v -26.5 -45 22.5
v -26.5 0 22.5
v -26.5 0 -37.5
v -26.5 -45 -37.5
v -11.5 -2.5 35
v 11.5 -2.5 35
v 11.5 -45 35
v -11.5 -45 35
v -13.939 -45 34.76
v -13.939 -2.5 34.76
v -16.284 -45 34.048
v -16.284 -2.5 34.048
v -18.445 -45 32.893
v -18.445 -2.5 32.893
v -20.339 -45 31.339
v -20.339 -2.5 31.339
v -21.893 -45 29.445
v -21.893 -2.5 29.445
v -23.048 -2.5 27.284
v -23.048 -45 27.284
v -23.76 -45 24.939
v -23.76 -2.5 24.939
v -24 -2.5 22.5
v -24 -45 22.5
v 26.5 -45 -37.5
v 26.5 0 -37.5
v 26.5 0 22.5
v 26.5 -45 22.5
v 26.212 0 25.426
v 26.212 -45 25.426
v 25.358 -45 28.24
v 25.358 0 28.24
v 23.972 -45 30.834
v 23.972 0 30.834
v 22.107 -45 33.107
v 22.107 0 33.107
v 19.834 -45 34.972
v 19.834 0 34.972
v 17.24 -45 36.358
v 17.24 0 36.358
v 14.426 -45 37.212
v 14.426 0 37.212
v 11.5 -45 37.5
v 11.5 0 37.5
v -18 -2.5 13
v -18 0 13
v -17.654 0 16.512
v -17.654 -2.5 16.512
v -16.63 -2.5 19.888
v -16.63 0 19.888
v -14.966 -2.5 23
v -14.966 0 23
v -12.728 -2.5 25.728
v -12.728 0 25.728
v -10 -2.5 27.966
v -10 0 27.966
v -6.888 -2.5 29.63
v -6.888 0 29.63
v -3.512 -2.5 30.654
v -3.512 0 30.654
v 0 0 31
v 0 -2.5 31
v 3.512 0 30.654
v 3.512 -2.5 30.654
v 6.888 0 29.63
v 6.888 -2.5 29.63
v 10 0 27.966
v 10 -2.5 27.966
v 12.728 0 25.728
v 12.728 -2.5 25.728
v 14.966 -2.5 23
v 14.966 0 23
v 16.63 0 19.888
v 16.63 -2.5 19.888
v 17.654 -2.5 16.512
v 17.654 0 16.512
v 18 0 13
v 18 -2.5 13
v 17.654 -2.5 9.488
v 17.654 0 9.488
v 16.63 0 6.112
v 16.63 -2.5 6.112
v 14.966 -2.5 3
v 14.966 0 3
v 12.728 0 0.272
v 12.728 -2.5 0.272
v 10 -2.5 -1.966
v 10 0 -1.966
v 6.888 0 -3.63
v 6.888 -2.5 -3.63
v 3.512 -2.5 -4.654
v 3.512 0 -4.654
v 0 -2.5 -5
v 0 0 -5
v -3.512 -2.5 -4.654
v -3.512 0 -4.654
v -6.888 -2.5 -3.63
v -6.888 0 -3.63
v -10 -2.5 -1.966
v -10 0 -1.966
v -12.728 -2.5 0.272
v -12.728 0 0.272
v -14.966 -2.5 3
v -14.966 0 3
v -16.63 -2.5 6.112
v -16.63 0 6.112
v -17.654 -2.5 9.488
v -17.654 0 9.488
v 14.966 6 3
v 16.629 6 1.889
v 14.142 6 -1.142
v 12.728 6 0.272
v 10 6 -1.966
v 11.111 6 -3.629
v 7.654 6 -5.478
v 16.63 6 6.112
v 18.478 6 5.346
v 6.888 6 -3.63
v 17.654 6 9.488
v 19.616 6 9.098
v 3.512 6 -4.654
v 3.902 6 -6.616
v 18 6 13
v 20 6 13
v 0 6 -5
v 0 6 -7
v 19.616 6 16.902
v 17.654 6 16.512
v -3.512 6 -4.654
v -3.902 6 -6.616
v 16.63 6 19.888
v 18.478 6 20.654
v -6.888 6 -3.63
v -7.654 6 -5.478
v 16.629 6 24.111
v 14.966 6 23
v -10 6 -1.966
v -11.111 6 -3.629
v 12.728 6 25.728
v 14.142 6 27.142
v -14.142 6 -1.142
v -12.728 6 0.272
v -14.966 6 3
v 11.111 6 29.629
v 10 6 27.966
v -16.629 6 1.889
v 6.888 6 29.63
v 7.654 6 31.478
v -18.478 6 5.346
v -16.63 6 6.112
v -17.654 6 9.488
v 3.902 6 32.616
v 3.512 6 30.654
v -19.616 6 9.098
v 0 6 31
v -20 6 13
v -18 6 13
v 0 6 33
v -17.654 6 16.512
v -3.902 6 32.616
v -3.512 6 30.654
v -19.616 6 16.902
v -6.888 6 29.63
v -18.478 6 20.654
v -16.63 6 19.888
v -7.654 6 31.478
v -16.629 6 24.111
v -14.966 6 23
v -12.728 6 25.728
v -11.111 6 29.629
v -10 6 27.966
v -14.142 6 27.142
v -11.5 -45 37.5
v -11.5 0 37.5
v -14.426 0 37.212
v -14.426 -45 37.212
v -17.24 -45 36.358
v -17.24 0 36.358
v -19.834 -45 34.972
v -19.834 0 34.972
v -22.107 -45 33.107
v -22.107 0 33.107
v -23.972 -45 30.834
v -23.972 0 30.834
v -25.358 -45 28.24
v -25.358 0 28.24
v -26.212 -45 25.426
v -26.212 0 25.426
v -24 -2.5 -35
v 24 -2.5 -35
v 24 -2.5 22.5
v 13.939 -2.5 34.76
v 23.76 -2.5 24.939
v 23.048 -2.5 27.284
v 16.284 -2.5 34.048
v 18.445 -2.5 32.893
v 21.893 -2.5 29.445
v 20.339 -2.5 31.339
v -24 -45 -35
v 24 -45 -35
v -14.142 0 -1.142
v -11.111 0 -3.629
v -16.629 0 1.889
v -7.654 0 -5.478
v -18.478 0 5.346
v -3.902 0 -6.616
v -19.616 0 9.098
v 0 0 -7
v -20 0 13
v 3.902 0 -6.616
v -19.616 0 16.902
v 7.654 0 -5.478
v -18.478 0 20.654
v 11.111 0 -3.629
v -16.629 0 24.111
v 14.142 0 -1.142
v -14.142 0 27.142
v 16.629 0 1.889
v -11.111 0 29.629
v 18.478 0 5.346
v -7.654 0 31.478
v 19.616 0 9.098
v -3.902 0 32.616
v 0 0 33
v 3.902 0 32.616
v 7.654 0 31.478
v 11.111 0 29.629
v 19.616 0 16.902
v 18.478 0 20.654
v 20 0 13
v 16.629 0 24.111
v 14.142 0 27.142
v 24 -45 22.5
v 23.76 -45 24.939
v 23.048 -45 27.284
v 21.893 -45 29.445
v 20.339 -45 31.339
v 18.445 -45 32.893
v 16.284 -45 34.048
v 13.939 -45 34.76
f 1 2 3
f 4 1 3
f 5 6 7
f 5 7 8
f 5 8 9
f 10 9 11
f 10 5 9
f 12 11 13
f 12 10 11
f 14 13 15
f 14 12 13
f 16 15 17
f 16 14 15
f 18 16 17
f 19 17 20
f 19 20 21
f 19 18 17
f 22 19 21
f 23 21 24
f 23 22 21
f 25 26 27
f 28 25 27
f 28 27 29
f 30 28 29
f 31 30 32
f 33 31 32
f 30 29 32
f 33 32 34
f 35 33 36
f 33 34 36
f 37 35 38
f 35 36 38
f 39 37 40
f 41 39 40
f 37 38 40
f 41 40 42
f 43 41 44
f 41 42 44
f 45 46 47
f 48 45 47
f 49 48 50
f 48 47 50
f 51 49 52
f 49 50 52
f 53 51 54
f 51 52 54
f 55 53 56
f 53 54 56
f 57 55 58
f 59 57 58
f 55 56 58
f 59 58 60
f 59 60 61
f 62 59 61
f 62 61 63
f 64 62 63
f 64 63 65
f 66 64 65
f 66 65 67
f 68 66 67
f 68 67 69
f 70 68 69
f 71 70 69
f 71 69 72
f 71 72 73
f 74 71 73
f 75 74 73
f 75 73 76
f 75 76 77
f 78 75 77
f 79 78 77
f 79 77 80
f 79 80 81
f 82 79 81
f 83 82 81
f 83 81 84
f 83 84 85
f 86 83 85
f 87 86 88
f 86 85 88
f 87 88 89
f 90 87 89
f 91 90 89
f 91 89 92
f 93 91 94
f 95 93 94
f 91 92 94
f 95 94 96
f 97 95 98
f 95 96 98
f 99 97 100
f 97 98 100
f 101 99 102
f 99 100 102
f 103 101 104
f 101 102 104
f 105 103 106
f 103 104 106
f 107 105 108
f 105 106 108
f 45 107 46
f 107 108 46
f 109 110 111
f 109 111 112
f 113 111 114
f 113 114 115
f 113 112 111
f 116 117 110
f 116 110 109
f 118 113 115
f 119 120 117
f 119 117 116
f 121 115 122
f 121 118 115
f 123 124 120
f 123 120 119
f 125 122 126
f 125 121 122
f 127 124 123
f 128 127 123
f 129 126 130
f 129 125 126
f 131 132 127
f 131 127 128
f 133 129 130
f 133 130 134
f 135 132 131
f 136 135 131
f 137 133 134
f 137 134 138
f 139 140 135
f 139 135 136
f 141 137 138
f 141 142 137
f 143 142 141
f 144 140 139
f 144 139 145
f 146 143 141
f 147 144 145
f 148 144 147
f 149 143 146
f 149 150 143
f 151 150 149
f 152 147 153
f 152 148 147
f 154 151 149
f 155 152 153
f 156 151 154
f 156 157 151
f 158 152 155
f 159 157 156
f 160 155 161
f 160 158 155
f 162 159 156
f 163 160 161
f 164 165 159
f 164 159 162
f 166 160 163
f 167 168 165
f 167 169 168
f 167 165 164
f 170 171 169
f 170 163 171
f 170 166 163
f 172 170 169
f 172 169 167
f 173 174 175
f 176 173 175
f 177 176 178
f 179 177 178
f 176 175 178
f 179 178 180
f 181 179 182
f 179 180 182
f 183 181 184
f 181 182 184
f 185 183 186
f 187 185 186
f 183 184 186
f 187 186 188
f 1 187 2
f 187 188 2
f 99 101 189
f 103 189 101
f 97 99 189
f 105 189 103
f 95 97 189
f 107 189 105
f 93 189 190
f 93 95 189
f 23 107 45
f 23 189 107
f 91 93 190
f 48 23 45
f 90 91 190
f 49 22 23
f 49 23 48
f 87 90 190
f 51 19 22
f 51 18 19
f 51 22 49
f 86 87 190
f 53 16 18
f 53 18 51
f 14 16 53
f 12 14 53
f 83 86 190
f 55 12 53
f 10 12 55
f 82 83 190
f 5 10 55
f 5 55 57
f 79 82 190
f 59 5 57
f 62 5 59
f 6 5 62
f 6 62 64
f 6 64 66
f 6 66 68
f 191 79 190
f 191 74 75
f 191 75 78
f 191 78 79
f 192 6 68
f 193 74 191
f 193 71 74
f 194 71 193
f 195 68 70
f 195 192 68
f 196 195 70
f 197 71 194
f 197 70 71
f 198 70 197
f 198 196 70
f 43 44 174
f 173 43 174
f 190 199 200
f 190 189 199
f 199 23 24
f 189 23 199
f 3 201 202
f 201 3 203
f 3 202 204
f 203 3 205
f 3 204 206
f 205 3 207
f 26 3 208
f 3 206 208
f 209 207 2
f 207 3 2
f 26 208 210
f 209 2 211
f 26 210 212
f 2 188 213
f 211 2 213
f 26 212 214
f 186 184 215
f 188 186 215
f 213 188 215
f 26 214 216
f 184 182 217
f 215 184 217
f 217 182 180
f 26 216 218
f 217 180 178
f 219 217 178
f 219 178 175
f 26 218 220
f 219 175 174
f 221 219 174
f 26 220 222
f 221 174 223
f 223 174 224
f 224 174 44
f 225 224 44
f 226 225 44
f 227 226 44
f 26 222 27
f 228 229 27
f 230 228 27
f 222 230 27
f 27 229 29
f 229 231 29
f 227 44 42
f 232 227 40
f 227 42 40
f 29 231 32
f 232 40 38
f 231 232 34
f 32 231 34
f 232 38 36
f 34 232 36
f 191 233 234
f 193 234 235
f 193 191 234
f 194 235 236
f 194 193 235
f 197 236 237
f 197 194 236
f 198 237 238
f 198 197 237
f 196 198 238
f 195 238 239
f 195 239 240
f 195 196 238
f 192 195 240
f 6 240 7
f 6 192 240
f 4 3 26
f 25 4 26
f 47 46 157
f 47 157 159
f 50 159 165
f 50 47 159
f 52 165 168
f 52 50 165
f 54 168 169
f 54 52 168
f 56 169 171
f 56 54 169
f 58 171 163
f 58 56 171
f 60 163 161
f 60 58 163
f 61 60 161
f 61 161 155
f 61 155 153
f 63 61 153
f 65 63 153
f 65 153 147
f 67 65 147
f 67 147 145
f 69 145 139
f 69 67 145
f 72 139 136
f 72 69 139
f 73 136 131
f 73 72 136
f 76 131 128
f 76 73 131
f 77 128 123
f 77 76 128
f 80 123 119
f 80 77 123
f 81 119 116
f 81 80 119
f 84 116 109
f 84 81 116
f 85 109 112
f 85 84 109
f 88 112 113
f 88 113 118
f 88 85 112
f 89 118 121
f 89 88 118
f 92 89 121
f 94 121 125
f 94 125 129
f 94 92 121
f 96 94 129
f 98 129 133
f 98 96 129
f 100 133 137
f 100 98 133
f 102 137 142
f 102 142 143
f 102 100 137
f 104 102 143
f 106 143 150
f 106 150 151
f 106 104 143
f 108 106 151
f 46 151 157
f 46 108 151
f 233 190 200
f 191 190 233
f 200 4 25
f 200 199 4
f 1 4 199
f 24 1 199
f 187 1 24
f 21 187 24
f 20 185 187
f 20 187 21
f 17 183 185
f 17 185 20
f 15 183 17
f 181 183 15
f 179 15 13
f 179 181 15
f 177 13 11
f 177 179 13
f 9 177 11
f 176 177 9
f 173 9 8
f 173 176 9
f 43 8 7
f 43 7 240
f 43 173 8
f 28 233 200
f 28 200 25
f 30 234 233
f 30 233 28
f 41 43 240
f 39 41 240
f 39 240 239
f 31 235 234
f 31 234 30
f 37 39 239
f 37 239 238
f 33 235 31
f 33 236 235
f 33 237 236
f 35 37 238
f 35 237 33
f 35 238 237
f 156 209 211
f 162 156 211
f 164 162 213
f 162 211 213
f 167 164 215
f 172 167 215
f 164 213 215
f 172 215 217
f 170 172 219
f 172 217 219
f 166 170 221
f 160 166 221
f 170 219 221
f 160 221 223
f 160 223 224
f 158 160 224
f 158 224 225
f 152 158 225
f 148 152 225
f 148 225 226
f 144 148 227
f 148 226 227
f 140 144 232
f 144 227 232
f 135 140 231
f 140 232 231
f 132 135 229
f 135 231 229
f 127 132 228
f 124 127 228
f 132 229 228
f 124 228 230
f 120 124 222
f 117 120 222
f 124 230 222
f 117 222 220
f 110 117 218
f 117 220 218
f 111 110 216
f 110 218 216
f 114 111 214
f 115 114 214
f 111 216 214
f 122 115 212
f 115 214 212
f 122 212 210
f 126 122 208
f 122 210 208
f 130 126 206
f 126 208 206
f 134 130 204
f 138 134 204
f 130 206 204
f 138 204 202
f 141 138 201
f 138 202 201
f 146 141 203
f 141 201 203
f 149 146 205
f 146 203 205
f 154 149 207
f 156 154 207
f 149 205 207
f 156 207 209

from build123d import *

# Parameters (mm, degrees)
F1_DEPTH = 45
F2_T     = -2.5
F3_R     = 18
F4_DEPTH = 25
F5_R     = 20
F5_R_2   = 18
F6_DEPTH = 6


with BuildPart() as f1:
    # F0 (on Front) → F1 (new body)
    with BuildSketch(Plane.XZ):
        with BuildLine():
            Line((-26.5, -37.5), (26.5, -37.5))
            Line((26.5, -37.5), (26.5, 22.5))
            ThreePointArc((26.5, 22.5), (22.106602, 33.106602), (11.5, 37.5))
            Line((11.5, 37.5), (-11.5, 37.5))
            ThreePointArc((-11.5, 37.5), (-22.106602, 33.106602), (-26.5, 22.5))
            Line((-26.5, 22.5), (-26.5, -37.5))
        make_face()
    extrude(amount=F1_DEPTH)

    # F2
    f2_openings = [f1.faces().sort_by_distance(p)[0] for p in [
        (0, -45, -0.850304),
    ]]
    offset(amount=F2_T, openings=f2_openings)

    # F3 (on face) → F4 (cut)
    with BuildSketch(Plane(origin=(0, 0, 0), x_dir=(-1, 0, 0), z_dir=(0, 1, 0))):
        with Locations((0, 13)):
            Circle(F3_R)
    extrude(amount=-F4_DEPTH, mode=Mode.SUBTRACT)

    # F5 (on face) → F6 (join)
    with BuildSketch(Plane(origin=(0, 0, 0), x_dir=(-1, 0, 0), z_dir=(0, 1, 0))):
        with Locations((0, 13)):
            Circle(F5_R)
        with Locations((0, 13)):
            Circle(F5_R_2, mode=Mode.SUBTRACT)
    extrude(amount=F6_DEPTH)


solid = f1.part
